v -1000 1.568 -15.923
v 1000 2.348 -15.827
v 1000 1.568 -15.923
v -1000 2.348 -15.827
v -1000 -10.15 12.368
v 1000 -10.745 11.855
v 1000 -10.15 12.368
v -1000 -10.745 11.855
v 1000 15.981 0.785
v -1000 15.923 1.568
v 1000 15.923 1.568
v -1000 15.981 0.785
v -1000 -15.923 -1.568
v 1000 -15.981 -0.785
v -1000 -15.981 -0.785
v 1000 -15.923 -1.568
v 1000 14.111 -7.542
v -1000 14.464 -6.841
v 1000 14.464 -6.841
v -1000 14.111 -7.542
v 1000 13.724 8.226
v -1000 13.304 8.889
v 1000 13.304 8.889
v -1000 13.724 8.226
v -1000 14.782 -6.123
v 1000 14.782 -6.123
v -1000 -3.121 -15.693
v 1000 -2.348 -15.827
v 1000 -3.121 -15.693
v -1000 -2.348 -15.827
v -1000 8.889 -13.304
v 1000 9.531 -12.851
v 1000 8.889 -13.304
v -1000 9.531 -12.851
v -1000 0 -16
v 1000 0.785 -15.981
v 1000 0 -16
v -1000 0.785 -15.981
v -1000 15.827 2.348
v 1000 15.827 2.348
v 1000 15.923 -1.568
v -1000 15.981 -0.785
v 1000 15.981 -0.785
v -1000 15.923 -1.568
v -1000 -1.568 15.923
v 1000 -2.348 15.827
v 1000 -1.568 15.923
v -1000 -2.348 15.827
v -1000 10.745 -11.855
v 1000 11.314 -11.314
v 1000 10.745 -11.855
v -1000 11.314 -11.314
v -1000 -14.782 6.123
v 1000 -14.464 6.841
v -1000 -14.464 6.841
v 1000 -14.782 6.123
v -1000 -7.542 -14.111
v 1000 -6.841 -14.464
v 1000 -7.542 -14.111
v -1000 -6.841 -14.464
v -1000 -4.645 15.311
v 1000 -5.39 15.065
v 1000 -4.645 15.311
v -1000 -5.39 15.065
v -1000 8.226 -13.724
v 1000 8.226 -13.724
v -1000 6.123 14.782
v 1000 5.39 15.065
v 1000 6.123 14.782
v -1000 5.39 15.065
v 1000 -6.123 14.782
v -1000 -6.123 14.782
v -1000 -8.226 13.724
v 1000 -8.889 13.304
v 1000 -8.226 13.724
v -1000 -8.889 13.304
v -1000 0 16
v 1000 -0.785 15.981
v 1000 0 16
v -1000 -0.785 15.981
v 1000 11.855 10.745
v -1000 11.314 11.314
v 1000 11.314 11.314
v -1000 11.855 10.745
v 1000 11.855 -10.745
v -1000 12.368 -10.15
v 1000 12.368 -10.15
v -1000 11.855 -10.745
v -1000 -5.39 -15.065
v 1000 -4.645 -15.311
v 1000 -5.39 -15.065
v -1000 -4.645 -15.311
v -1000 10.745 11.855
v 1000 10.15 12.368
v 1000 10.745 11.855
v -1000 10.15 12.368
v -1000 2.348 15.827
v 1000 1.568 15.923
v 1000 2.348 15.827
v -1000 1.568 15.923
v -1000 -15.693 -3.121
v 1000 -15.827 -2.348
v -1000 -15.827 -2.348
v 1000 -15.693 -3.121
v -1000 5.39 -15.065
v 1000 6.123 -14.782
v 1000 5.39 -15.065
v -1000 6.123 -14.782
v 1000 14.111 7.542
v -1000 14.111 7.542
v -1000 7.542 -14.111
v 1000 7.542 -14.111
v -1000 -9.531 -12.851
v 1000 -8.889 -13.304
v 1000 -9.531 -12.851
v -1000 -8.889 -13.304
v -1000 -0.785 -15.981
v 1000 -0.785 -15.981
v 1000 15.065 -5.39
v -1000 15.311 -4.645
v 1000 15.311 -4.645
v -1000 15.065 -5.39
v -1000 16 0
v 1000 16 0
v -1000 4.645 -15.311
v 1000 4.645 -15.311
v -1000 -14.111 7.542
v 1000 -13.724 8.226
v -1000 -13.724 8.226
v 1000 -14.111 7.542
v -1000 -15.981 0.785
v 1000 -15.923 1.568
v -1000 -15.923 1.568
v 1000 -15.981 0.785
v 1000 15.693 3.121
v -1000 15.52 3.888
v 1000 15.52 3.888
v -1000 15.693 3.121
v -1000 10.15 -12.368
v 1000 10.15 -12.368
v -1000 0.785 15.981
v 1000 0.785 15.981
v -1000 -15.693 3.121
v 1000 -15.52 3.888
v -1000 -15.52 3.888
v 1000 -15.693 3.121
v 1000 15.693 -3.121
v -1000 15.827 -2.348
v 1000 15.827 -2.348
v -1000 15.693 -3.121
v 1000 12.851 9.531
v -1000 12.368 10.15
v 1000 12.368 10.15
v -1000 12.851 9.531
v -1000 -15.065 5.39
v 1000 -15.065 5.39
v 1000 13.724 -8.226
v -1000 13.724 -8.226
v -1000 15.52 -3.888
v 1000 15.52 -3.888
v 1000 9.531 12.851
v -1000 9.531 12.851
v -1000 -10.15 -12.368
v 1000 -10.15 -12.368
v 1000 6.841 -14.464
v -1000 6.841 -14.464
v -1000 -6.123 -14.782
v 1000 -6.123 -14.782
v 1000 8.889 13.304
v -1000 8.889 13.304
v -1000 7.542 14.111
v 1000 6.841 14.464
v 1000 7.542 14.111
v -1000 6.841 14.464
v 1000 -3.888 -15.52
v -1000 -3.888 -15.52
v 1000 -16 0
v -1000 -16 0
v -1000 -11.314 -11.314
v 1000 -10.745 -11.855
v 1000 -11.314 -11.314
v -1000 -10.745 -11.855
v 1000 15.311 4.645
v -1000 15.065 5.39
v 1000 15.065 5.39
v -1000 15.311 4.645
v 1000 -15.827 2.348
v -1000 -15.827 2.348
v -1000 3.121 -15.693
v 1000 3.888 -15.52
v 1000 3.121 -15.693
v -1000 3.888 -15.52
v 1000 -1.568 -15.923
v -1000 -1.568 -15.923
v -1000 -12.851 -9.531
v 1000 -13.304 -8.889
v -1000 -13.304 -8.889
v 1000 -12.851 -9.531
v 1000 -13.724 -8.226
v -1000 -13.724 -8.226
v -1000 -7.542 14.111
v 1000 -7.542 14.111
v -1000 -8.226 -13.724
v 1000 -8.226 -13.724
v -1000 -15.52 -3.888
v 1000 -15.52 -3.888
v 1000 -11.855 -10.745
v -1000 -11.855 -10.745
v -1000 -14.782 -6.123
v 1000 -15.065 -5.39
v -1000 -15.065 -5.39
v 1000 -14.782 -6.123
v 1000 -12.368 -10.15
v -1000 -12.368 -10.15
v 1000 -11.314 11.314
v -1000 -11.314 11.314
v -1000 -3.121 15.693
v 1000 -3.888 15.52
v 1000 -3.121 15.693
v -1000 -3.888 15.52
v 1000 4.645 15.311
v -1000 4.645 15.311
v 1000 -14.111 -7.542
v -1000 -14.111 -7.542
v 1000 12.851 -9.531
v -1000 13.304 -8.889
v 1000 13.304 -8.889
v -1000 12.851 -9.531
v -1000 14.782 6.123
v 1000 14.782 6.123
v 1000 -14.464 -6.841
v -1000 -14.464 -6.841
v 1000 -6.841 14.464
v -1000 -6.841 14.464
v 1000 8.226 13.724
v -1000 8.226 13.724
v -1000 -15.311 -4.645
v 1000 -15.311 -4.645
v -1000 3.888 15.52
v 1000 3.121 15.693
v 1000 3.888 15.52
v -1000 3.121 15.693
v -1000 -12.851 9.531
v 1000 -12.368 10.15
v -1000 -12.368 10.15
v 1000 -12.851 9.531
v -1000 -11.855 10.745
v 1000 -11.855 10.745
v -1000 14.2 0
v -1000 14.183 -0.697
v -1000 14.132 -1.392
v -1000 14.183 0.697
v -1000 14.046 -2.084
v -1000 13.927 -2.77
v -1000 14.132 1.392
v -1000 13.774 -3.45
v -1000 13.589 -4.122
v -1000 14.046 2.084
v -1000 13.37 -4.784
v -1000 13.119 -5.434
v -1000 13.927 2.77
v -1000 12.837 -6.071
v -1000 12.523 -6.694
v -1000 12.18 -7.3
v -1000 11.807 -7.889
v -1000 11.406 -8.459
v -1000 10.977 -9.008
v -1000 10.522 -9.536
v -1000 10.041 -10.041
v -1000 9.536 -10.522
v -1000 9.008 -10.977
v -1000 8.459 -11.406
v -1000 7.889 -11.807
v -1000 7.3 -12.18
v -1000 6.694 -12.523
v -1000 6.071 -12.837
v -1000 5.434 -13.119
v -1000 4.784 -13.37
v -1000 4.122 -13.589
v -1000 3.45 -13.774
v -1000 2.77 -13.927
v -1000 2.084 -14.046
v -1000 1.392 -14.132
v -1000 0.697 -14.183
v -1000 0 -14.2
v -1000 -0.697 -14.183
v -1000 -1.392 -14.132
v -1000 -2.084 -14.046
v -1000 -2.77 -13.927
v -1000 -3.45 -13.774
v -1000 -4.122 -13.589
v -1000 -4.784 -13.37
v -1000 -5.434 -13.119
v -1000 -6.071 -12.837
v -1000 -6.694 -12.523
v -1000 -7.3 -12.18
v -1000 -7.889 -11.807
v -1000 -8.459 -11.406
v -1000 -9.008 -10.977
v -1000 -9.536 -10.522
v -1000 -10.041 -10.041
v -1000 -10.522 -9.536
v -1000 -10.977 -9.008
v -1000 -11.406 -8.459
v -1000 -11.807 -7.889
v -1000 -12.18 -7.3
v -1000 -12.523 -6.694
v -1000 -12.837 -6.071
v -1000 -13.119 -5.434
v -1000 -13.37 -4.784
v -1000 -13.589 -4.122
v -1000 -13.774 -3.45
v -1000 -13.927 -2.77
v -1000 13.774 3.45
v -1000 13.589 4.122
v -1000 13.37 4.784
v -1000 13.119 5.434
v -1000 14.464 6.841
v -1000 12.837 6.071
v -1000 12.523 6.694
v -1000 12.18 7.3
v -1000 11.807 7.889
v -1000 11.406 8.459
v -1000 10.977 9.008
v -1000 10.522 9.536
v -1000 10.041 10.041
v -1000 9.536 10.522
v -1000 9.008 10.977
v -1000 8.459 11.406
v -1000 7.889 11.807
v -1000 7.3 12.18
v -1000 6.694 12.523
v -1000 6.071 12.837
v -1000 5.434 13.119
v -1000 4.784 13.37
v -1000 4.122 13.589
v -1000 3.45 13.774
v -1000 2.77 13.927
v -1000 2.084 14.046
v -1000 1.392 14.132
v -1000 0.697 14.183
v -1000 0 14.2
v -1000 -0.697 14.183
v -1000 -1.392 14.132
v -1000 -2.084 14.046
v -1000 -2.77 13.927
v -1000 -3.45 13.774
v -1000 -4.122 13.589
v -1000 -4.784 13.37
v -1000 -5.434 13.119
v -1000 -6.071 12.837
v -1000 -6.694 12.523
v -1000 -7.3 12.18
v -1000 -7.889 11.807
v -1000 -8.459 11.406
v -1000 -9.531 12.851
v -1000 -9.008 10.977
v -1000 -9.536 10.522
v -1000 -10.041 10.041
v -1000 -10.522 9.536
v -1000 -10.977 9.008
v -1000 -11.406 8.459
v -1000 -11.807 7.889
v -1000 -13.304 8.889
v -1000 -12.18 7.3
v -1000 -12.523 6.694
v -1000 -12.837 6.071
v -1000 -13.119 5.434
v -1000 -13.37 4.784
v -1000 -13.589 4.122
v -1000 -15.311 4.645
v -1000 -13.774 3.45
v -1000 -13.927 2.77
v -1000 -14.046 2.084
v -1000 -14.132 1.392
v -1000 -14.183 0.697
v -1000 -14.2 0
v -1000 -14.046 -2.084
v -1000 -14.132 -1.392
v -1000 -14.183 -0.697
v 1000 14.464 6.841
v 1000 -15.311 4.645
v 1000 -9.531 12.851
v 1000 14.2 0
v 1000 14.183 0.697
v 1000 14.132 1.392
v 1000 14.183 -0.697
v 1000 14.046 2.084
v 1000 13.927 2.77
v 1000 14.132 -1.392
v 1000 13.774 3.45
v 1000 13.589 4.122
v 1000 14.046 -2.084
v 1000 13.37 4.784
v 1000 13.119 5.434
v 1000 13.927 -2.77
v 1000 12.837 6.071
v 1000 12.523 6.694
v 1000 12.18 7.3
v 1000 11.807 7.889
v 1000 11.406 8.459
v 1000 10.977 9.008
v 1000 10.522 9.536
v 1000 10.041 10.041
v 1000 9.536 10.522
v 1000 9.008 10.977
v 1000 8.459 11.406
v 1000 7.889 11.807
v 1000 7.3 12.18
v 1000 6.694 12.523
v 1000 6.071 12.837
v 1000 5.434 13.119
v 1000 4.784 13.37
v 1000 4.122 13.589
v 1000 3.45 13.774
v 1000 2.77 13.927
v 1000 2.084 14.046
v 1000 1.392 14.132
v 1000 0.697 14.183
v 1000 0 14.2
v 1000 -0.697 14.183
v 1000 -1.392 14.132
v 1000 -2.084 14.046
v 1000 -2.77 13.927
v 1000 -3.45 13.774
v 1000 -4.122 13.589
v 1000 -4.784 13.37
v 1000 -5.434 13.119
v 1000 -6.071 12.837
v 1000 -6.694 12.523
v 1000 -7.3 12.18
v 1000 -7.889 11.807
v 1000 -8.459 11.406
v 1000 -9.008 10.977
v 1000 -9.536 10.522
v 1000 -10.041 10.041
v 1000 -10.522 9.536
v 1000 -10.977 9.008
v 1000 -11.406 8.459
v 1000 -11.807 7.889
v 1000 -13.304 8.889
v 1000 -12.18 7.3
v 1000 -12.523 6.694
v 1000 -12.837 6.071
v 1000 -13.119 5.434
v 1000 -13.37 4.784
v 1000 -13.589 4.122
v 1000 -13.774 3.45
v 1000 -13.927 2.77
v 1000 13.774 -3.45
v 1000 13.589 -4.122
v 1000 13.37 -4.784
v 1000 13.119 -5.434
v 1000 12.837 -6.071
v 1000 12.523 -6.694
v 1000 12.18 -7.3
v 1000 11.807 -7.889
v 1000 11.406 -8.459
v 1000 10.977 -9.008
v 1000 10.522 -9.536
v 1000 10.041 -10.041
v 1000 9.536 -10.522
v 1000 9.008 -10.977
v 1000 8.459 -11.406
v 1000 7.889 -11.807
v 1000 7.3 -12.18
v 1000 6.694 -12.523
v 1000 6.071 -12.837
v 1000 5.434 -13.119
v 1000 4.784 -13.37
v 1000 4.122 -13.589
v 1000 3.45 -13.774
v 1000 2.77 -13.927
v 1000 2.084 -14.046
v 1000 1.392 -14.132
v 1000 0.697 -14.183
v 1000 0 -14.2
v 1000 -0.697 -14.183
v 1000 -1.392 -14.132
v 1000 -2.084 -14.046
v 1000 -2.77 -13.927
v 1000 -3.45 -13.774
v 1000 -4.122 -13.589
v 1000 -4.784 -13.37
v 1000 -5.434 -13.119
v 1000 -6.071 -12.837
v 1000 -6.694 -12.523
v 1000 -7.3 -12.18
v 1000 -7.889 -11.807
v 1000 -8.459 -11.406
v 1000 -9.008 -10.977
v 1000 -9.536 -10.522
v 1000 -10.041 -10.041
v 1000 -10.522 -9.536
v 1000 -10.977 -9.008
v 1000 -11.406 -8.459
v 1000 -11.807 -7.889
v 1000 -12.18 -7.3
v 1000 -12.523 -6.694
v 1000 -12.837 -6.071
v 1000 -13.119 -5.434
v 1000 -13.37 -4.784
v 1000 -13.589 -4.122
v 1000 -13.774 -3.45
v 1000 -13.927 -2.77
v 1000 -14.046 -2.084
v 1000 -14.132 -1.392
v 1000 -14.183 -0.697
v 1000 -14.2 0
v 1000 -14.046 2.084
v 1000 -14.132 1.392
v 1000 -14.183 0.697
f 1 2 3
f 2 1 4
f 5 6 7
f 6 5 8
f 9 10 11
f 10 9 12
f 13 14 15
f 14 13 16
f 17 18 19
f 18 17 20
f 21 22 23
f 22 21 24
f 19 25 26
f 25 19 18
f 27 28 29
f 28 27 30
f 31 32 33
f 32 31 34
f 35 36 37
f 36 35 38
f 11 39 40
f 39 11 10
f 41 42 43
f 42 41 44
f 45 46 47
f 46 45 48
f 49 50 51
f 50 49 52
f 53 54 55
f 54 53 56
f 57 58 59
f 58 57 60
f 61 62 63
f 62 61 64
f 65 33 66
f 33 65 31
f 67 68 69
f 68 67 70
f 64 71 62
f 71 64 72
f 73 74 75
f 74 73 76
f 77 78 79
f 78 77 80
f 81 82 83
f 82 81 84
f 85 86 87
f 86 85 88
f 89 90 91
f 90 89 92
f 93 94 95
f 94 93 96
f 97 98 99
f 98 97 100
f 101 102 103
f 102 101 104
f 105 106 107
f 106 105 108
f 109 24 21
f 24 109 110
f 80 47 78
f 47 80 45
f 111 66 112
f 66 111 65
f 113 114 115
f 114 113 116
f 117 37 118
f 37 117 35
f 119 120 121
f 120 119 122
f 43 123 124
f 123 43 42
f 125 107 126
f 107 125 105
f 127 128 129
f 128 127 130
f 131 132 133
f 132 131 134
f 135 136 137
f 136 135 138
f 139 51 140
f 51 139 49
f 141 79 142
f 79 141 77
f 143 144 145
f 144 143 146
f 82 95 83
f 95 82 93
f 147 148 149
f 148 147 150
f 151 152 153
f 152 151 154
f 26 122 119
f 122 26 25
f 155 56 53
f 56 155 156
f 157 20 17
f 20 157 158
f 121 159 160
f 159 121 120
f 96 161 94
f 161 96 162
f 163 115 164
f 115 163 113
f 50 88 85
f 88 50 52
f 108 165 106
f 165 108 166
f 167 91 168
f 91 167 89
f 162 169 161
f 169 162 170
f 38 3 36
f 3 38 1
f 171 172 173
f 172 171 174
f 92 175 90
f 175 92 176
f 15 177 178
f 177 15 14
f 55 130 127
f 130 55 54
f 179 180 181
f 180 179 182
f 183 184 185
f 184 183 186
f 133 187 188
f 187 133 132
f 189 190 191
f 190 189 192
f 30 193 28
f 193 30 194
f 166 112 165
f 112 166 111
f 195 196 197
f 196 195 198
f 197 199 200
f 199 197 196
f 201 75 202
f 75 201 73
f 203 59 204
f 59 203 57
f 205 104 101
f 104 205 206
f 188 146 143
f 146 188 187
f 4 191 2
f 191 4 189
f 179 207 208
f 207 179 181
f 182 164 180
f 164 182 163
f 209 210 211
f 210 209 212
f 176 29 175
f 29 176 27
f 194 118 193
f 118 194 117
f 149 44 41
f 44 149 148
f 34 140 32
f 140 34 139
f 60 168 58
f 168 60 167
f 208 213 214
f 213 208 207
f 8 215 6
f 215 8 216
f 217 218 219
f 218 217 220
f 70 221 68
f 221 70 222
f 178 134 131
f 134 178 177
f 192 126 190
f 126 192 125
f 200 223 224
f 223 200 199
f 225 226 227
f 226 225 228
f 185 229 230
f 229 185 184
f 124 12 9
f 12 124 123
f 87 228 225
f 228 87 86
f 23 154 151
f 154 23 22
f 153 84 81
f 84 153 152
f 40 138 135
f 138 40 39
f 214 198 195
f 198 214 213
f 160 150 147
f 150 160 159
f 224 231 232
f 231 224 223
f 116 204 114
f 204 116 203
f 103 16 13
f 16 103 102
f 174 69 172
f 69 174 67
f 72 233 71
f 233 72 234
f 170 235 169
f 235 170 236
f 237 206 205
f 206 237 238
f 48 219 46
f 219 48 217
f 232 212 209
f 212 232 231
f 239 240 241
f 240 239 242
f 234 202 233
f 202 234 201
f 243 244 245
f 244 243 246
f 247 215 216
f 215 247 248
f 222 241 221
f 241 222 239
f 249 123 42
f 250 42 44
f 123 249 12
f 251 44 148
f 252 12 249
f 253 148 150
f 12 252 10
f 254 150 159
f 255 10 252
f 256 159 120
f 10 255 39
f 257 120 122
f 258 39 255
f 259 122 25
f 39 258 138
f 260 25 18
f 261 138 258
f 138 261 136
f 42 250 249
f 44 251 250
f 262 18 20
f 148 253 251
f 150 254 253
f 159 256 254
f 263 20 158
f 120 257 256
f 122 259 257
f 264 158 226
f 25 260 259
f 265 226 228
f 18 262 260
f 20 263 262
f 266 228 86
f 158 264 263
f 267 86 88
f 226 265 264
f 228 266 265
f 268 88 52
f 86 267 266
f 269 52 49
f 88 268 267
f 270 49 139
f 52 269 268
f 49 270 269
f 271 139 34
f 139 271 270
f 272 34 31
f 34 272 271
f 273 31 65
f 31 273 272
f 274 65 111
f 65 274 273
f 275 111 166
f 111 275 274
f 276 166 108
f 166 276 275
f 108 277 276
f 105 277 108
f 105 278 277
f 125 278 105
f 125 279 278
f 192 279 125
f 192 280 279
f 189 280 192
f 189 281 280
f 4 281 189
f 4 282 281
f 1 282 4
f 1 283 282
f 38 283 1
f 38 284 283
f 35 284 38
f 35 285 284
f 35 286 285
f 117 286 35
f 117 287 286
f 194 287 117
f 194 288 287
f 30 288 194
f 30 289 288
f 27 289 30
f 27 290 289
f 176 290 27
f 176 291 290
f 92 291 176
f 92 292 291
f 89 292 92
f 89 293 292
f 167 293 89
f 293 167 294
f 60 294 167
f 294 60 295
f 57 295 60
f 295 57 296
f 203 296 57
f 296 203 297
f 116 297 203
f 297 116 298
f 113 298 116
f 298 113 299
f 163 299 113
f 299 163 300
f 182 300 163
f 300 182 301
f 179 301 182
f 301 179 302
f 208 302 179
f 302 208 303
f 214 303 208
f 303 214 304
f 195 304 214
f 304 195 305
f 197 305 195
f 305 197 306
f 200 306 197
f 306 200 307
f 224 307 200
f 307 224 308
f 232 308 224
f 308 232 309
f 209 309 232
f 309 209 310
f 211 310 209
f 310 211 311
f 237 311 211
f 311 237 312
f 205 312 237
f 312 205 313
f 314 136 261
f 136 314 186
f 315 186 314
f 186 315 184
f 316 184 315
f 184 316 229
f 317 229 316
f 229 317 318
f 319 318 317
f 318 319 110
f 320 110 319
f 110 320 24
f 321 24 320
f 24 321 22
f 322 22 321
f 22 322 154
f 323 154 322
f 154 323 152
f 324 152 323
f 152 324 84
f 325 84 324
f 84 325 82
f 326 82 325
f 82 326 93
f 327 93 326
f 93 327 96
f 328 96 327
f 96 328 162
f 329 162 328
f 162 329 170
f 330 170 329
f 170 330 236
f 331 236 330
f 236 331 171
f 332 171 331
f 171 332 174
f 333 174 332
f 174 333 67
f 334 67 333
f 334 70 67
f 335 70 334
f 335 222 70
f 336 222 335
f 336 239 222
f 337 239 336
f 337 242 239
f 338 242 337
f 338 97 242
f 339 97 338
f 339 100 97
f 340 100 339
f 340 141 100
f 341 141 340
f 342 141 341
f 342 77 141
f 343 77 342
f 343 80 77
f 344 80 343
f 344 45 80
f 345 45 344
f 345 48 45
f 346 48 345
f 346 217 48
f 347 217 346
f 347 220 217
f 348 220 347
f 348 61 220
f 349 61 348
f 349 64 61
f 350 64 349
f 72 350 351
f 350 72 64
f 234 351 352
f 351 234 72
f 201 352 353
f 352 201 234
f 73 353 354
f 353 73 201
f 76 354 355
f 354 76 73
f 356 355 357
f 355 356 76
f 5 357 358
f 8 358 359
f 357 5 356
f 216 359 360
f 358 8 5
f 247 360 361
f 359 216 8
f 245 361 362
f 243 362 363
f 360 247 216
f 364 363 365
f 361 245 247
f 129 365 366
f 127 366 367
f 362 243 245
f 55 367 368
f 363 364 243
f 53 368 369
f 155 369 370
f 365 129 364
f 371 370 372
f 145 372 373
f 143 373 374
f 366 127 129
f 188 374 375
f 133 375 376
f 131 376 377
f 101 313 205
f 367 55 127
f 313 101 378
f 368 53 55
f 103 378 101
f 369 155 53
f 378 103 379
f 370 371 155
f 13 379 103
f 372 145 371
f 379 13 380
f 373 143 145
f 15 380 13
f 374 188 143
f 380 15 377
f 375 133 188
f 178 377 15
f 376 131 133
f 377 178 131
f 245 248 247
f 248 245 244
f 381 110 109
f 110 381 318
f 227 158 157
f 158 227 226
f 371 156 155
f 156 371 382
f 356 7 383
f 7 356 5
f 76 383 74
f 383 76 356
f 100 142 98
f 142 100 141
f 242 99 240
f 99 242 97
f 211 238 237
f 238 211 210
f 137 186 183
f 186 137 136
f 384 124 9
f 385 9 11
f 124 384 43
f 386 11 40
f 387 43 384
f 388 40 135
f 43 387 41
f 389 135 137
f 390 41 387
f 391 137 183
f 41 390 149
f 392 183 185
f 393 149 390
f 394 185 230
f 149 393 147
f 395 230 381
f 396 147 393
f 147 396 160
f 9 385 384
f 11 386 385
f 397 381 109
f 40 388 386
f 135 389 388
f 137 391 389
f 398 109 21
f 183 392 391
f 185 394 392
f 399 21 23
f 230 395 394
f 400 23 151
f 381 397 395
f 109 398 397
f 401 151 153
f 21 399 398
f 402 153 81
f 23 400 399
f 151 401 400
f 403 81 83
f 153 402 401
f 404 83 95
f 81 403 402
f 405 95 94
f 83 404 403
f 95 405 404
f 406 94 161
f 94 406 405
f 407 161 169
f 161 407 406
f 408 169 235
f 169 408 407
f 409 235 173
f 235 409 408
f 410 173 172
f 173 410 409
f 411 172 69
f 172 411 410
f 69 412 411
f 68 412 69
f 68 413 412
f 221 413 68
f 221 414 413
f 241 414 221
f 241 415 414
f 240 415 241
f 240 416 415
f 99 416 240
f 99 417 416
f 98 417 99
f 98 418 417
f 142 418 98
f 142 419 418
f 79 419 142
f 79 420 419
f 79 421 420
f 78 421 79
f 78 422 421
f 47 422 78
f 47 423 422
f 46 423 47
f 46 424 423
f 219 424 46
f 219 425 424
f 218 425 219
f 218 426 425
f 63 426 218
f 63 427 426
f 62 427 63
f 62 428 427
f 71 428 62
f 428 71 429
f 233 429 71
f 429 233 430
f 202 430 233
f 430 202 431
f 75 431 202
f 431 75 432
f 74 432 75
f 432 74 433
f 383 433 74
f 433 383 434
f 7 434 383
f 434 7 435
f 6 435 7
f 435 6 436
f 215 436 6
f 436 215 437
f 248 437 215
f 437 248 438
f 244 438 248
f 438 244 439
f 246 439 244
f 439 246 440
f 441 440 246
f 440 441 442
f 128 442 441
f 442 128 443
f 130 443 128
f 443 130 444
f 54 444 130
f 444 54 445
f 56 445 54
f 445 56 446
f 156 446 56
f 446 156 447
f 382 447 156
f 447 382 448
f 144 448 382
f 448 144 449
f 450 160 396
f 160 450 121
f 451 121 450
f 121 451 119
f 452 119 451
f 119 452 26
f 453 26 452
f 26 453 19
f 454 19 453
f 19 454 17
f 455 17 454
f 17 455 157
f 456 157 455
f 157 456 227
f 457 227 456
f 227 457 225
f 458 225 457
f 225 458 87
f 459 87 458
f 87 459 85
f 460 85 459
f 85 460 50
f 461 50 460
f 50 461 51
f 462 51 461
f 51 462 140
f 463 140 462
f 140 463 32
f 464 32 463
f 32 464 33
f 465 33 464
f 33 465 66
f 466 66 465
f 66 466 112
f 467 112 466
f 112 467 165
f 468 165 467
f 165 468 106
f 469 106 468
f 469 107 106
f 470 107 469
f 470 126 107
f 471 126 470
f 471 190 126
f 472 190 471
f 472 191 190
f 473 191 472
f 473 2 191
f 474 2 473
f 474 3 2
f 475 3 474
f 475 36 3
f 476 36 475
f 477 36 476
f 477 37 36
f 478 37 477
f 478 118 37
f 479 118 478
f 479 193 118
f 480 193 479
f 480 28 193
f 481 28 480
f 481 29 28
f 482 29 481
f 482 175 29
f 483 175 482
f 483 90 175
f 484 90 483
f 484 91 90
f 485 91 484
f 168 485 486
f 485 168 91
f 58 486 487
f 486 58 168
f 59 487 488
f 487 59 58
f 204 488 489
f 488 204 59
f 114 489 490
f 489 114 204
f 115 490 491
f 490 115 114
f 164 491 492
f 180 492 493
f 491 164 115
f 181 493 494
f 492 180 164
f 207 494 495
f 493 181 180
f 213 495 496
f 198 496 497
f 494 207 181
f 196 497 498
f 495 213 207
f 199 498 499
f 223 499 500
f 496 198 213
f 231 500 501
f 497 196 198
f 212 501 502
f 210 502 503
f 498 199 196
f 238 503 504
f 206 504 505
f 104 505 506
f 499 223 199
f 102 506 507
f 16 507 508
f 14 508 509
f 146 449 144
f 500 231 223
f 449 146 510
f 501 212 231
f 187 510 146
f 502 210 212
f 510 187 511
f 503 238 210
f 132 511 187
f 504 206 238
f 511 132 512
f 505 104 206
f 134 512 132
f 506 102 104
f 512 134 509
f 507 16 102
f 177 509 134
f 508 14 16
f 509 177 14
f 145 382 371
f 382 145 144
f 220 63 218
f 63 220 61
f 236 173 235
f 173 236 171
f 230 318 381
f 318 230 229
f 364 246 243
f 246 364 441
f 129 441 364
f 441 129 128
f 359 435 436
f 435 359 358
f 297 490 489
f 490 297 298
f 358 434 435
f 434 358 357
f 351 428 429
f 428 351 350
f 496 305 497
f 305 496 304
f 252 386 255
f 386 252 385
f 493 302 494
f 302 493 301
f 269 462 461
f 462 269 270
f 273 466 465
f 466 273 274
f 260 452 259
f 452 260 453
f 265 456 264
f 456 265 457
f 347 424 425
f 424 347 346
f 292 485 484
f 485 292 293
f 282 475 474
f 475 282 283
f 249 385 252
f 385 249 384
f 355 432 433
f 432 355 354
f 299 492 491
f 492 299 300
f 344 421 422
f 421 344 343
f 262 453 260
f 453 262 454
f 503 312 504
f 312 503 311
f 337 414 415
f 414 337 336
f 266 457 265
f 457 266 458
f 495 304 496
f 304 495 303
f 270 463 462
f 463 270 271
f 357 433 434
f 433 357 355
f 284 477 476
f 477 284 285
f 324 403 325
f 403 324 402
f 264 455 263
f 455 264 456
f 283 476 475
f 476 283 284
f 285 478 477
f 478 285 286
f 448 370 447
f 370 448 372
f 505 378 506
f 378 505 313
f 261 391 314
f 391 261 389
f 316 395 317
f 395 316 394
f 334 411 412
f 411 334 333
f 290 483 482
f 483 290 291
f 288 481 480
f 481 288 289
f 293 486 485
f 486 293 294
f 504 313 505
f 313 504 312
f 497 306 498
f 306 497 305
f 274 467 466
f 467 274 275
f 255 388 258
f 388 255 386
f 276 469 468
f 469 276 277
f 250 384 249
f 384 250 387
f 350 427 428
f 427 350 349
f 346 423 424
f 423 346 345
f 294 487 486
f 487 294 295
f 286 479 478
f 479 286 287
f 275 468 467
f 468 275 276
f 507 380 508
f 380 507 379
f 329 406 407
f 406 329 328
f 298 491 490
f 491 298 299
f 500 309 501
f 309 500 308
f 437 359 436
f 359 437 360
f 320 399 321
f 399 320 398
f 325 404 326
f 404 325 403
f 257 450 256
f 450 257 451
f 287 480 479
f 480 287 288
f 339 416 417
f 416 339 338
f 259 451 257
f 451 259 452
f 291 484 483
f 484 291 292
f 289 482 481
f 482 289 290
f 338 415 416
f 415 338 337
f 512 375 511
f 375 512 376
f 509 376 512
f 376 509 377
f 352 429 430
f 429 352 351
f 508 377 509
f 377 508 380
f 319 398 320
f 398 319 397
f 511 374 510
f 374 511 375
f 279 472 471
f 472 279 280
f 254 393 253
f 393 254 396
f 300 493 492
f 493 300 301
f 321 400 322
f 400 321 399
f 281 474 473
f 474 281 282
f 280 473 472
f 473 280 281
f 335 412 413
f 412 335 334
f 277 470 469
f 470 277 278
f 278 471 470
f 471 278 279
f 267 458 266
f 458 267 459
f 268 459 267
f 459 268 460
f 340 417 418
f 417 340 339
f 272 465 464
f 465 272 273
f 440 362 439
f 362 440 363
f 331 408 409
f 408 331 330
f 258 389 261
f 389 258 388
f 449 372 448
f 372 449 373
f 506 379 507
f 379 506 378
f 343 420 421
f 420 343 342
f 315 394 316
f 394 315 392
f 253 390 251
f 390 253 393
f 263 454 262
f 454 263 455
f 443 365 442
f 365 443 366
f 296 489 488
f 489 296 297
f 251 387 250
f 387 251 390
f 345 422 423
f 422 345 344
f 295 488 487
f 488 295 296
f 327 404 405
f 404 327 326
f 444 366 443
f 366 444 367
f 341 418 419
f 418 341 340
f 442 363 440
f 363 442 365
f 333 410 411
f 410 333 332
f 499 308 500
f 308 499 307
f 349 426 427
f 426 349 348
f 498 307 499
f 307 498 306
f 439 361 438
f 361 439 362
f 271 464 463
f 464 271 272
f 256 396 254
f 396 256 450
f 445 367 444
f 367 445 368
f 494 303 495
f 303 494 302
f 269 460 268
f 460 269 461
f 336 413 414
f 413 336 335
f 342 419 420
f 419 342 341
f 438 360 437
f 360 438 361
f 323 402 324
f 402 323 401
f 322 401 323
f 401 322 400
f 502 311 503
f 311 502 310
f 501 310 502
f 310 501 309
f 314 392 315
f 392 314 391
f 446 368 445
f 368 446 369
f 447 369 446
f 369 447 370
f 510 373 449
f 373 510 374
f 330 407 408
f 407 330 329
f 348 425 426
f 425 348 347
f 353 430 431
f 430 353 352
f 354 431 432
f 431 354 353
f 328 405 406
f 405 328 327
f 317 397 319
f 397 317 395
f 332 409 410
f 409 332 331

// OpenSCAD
$fn = 128;

// HT 32 pipe parameters (mm)
pipe_length     = 2000;
outer_diameter  = 32;
wall_thickness  = 1.8;

inner_diameter = outer_diameter - 2*wall_thickness;

// Place pipe axis along X so front/back/left/right views show the circular profile
module ht_pipe(od=32, id=28.4, L=2000) {
    difference() {
        rotate([0, 90, 0])
            cylinder(h=L, d=od, center=true);
        rotate([0, 90, 0])
            cylinder(h=L + 0.2, d=id, center=true);
    }
}

ht_pipe(outer_diameter, inner_diameter, pipe_length);
